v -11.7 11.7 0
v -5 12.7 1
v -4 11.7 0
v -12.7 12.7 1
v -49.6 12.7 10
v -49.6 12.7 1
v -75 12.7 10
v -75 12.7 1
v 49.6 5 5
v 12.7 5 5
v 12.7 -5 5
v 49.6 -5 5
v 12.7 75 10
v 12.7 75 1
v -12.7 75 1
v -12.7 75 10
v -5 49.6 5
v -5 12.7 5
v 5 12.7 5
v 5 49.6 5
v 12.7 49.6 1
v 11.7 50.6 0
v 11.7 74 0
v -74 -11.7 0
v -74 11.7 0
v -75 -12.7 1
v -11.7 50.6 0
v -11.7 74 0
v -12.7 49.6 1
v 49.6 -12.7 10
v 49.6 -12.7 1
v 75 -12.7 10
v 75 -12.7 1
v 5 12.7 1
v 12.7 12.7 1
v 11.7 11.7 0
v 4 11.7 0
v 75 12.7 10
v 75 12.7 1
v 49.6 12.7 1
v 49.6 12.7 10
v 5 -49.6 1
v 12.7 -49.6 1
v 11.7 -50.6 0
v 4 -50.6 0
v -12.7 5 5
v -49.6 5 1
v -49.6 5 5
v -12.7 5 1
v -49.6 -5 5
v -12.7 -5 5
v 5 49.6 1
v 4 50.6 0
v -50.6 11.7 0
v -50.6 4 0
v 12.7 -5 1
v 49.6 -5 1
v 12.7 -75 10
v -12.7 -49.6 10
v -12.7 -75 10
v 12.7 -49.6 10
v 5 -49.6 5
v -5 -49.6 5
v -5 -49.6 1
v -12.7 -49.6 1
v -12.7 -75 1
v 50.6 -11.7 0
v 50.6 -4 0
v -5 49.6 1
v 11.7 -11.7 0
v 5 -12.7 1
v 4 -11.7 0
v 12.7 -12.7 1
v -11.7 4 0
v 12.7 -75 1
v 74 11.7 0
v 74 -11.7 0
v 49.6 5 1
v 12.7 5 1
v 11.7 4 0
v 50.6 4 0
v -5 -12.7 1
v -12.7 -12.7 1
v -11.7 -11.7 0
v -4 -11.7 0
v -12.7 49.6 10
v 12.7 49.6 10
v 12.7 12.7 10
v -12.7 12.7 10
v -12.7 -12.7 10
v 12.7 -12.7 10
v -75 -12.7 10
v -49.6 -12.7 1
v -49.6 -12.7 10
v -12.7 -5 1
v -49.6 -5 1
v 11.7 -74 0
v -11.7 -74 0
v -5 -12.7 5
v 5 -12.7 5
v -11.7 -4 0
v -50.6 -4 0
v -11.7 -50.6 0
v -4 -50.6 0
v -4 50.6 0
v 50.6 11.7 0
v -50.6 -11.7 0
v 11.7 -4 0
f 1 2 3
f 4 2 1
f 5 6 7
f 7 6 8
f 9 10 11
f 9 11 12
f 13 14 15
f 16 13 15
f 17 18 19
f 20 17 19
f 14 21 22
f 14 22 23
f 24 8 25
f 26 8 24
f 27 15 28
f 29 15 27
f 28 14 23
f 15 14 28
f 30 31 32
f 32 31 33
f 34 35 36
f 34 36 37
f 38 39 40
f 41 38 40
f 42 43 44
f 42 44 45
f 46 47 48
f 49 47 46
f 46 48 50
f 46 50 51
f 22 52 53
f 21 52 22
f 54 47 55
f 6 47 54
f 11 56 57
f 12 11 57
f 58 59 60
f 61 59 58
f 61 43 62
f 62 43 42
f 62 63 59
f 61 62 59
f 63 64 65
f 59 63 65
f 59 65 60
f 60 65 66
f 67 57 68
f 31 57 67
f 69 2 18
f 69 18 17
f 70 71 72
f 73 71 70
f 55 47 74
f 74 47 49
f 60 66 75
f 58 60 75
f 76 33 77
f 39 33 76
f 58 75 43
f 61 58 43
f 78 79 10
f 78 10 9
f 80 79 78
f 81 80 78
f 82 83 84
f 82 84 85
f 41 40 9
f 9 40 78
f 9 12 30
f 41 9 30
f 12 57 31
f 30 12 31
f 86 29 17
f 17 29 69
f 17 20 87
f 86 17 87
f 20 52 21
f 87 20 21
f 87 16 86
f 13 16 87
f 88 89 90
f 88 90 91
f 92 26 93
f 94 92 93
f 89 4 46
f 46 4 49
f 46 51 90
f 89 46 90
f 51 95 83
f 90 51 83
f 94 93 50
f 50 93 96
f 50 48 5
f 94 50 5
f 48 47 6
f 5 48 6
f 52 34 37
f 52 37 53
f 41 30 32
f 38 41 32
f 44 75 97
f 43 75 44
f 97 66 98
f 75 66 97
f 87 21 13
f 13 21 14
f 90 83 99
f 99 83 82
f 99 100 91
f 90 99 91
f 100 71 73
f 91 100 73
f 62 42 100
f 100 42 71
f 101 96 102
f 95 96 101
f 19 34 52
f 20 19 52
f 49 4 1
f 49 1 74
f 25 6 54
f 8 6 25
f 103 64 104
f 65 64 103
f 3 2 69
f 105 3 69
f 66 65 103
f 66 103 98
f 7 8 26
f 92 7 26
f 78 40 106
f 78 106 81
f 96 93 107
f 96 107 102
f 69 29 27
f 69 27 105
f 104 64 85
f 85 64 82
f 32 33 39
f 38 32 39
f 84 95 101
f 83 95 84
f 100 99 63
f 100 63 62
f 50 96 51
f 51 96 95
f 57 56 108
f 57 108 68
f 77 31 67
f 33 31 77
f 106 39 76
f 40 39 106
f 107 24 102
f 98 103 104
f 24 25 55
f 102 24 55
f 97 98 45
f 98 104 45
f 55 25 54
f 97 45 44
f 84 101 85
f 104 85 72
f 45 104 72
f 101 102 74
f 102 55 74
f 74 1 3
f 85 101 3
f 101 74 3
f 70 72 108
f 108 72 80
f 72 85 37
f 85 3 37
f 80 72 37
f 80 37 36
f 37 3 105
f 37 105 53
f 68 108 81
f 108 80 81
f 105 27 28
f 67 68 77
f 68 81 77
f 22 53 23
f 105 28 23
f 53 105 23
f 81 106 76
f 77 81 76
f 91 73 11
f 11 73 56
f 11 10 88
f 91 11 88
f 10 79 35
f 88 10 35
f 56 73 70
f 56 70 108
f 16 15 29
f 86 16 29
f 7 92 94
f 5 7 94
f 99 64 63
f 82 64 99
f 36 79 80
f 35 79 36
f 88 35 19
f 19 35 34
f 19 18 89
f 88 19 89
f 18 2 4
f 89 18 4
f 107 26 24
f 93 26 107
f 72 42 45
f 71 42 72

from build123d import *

# Parameters (mm, degrees)
F0_W     = 36.9
F0_H     = 10
F0_W_2   = 10
F0_H_2   = 36.9
F1_DEPTH = 5
F2_DEPTH = 10
F3_SIZE  = 1


with BuildPart() as f1:
    # F0 (on Top) → F1 (new body)
    with BuildSketch(Plane.XY):
        Polygon((49.6, 12.7), (49.6, 5), (49.6, -5), (49.6, -12.7), (75, -12.7), (75, -5), (75, 5), (75, 12.7), align=None)
        with Locations((31.15, 0)):
            Rectangle(F0_W, F0_H)
        Polygon((5, 12.7), (-5, 12.7), (-12.7, 12.7), (-12.7, 5), (-12.7, -5), (-12.7, -12.7), (-5, -12.7), (5, -12.7), (12.7, -12.7), (12.7, -5), (12.7, 5), (12.7, 12.7), align=None)
        with Locations((0, -31.15)):
            Rectangle(F0_W_2, F0_H_2)
        Polygon((5, -49.6), (-5, -49.6), (-12.7, -49.6), (-12.7, -75), (-5, -75), (5, -75), (12.7, -75), (12.7, -49.6), align=None)
        with Locations((-31.15, 0)):
            Rectangle(F0_W, F0_H)
        Polygon((-49.6, -5), (-49.6, 5), (-49.6, 12.7), (-75, 12.7), (-75, 5), (-75, -5), (-75, -12.7), (-49.6, -12.7), align=None)
        with Locations((0, 31.15)):
            Rectangle(F0_W_2, F0_H_2)
        Polygon((-5, 75), (-12.7, 75), (-12.7, 49.6), (-5, 49.6), (5, 49.6), (12.7, 49.6), (12.7, 75), (5, 75), align=None)
    extrude(amount=F1_DEPTH)

    # F0 (on Top) → F2 (join)
    with BuildSketch(Plane.XY):
        Polygon((-49.6, -5), (-49.6, 5), (-49.6, 12.7), (-75, 12.7), (-75, 5), (-75, -5), (-75, -12.7), (-49.6, -12.7), align=None)
        Polygon((-5, 75), (-12.7, 75), (-12.7, 49.6), (-5, 49.6), (5, 49.6), (12.7, 49.6), (12.7, 75), (5, 75), align=None)
        Polygon((49.6, 12.7), (49.6, 5), (49.6, -5), (49.6, -12.7), (75, -12.7), (75, -5), (75, 5), (75, 12.7), align=None)
        Polygon((5, 12.7), (-5, 12.7), (-12.7, 12.7), (-12.7, 5), (-12.7, -5), (-12.7, -12.7), (-5, -12.7), (5, -12.7), (12.7, -12.7), (12.7, -5), (12.7, 5), (12.7, 12.7), align=None)
        Polygon((5, -49.6), (-5, -49.6), (-12.7, -49.6), (-12.7, -75), (-5, -75), (5, -75), (12.7, -75), (12.7, -49.6), align=None)
    extrude(amount=F2_DEPTH)

    # F3
    f3_edges = [f1.edges().sort_by_distance(p)[0] for p in [
        (0, 75, 0),
        (-12.7, 62.3, 0),
        (-8.85, 49.6, 0),
        (-5, 31.15, 0),
        (-8.85, 12.7, 0),
        (-12.7, 8.85, 0),
        (-31.15, 5, 0),
        (-49.6, 8.85, 0),
        (-62.3, 12.7, 0),
        (-75, 0, 0),
        (-62.3, -12.7, 0),
        (-49.6, -8.85, 0),
        (-31.15, -5, 0),
        (-12.7, -8.85, 0),
        (-8.85, -12.7, 0),
        (-5, -31.15, 0),
        (-8.85, -49.6, 0),
        (-12.7, -62.3, 0),
        (0, -75, 0),
        (12.7, -62.3, 0),
        (8.85, -49.6, 0),
        (5, -31.15, 0),
        (8.85, -12.7, 0),
        (12.7, -8.85, 0),
        (31.15, -5, 0),
        (49.6, -8.85, 0),
        (62.3, -12.7, 0),
        (75, 0, 0),
        (62.3, 12.7, 0),
        (49.6, 8.85, 0),
        (31.15, 5, 0),
        (12.7, 8.85, 0),
        (8.85, 12.7, 0),
        (5, 31.15, 0),
        (8.85, 49.6, 0),
        (12.7, 62.3, 0),
    ]]
    chamfer(f3_edges, length=F3_SIZE)


solid = f1.part
